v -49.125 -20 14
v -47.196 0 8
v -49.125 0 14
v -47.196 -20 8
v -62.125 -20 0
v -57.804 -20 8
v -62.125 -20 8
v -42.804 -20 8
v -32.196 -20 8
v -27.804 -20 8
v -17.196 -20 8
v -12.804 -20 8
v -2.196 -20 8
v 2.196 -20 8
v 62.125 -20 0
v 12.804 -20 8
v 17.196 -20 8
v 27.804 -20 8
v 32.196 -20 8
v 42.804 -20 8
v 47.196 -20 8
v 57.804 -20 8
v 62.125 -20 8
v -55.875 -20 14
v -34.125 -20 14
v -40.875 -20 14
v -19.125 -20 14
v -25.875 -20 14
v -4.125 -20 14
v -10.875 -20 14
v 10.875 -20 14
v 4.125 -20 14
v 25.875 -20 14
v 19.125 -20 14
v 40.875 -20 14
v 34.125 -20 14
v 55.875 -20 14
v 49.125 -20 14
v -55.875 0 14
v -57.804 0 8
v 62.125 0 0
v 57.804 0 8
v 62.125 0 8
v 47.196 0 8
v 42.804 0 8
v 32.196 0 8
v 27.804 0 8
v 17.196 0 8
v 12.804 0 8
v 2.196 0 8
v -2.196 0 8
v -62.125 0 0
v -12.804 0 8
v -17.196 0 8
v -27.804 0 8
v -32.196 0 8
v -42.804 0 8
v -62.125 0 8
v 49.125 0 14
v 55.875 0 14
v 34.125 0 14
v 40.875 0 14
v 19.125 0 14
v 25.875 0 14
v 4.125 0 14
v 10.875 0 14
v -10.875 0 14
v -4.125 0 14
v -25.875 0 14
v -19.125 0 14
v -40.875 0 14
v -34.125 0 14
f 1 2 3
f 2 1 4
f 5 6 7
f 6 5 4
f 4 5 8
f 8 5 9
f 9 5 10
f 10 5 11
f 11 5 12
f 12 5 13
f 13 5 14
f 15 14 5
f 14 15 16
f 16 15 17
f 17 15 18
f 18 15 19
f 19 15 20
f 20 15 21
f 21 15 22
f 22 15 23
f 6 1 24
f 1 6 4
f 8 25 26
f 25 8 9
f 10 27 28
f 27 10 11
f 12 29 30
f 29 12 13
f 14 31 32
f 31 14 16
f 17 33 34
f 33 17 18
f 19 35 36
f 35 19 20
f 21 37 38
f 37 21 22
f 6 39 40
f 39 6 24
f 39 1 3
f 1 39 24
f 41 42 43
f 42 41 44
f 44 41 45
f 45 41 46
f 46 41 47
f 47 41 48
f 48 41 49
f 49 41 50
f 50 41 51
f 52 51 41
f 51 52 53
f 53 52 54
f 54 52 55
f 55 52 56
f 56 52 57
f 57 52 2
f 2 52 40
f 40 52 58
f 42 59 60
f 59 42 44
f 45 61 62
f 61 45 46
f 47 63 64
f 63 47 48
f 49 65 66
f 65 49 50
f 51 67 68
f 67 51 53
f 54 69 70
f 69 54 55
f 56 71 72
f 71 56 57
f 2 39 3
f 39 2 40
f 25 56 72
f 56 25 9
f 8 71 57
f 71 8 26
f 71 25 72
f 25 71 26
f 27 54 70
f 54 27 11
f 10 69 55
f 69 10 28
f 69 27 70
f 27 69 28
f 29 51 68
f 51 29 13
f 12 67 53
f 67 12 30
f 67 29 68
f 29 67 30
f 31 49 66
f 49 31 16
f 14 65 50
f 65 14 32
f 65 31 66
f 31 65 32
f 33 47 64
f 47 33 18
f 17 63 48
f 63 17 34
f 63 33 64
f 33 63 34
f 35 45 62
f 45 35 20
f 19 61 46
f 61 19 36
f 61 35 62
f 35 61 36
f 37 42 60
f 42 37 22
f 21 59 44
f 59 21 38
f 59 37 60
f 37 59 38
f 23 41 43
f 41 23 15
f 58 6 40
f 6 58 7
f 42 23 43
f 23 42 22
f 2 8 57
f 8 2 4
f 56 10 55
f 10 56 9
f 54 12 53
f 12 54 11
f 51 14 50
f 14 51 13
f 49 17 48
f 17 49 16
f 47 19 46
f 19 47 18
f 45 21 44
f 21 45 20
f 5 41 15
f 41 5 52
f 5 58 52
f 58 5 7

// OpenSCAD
$fn = 32;

// ----------------------------------------------------------------------
// Toothed rack, 8 teeth
// 15 mm pitch, 6 mm teeth
// ----------------------------------------------------------------------

// --- parameters (mm) ---
bar_w = 20;      // bar width (Y)
seat_tol = 0.1;  // tolerance at the seating features
free_tol = 0.3;  // general tolerance on the free sizes
bar_h = 8;       // bar height (Z)
teeth = 8;       // number of teeth
pitch = 15;      // tooth pitch
tooth_h = 6;     // tooth height above the bar
root_w = 11.25;  // tooth width at the root
crest_w = 6.75;  // tooth width at the crest

// --- derived feature positions (mm) ---
span = (teeth - 1) * pitch;  // = 105   distance between the outer teeth
bar_l = span + root_w + 8;   // = 124.25   bar length: teeth plus 4 mm at each end
tooth_x = -span / 2;         // = -52.5   X of the first tooth
height = bar_h + tooth_h;    // = 14   overall height
feature_centers = [
  [tooth_x + 0 * pitch, -bar_w / 2],
  [tooth_x + 1 * pitch, -bar_w / 2],
  [tooth_x + 2 * pitch, -bar_w / 2],
  [tooth_x + 3 * pitch, -bar_w / 2],
  [tooth_x + 4 * pitch, -bar_w / 2],
  [tooth_x + 5 * pitch, -bar_w / 2],
  [tooth_x + 6 * pitch, -bar_w / 2],
  [tooth_x + 7 * pitch, -bar_w / 2]
];   // tooth centre line, drives the tooth loop

// bar with a rack of teeth, one extruded trapezoium per centre
module rack_tooth() {
  linear_extrude(height = bar_w)
    polygon(points = [
      [0, 0],
      [root_w, 0],
      [root_w / 2 + crest_w / 2, tooth_h + 1],
      [root_w / 2 - crest_w / 2, tooth_h + 1]
    ]);
}

union() {
  translate([-bar_l / 2, -bar_w, 0]) cube([bar_l, bar_w, bar_h]);
  for (centre = feature_centers)
    translate([centre[0] - root_w / 2, 0, bar_h - 1]) rotate([90, 0, 0]) rack_tooth();
}
